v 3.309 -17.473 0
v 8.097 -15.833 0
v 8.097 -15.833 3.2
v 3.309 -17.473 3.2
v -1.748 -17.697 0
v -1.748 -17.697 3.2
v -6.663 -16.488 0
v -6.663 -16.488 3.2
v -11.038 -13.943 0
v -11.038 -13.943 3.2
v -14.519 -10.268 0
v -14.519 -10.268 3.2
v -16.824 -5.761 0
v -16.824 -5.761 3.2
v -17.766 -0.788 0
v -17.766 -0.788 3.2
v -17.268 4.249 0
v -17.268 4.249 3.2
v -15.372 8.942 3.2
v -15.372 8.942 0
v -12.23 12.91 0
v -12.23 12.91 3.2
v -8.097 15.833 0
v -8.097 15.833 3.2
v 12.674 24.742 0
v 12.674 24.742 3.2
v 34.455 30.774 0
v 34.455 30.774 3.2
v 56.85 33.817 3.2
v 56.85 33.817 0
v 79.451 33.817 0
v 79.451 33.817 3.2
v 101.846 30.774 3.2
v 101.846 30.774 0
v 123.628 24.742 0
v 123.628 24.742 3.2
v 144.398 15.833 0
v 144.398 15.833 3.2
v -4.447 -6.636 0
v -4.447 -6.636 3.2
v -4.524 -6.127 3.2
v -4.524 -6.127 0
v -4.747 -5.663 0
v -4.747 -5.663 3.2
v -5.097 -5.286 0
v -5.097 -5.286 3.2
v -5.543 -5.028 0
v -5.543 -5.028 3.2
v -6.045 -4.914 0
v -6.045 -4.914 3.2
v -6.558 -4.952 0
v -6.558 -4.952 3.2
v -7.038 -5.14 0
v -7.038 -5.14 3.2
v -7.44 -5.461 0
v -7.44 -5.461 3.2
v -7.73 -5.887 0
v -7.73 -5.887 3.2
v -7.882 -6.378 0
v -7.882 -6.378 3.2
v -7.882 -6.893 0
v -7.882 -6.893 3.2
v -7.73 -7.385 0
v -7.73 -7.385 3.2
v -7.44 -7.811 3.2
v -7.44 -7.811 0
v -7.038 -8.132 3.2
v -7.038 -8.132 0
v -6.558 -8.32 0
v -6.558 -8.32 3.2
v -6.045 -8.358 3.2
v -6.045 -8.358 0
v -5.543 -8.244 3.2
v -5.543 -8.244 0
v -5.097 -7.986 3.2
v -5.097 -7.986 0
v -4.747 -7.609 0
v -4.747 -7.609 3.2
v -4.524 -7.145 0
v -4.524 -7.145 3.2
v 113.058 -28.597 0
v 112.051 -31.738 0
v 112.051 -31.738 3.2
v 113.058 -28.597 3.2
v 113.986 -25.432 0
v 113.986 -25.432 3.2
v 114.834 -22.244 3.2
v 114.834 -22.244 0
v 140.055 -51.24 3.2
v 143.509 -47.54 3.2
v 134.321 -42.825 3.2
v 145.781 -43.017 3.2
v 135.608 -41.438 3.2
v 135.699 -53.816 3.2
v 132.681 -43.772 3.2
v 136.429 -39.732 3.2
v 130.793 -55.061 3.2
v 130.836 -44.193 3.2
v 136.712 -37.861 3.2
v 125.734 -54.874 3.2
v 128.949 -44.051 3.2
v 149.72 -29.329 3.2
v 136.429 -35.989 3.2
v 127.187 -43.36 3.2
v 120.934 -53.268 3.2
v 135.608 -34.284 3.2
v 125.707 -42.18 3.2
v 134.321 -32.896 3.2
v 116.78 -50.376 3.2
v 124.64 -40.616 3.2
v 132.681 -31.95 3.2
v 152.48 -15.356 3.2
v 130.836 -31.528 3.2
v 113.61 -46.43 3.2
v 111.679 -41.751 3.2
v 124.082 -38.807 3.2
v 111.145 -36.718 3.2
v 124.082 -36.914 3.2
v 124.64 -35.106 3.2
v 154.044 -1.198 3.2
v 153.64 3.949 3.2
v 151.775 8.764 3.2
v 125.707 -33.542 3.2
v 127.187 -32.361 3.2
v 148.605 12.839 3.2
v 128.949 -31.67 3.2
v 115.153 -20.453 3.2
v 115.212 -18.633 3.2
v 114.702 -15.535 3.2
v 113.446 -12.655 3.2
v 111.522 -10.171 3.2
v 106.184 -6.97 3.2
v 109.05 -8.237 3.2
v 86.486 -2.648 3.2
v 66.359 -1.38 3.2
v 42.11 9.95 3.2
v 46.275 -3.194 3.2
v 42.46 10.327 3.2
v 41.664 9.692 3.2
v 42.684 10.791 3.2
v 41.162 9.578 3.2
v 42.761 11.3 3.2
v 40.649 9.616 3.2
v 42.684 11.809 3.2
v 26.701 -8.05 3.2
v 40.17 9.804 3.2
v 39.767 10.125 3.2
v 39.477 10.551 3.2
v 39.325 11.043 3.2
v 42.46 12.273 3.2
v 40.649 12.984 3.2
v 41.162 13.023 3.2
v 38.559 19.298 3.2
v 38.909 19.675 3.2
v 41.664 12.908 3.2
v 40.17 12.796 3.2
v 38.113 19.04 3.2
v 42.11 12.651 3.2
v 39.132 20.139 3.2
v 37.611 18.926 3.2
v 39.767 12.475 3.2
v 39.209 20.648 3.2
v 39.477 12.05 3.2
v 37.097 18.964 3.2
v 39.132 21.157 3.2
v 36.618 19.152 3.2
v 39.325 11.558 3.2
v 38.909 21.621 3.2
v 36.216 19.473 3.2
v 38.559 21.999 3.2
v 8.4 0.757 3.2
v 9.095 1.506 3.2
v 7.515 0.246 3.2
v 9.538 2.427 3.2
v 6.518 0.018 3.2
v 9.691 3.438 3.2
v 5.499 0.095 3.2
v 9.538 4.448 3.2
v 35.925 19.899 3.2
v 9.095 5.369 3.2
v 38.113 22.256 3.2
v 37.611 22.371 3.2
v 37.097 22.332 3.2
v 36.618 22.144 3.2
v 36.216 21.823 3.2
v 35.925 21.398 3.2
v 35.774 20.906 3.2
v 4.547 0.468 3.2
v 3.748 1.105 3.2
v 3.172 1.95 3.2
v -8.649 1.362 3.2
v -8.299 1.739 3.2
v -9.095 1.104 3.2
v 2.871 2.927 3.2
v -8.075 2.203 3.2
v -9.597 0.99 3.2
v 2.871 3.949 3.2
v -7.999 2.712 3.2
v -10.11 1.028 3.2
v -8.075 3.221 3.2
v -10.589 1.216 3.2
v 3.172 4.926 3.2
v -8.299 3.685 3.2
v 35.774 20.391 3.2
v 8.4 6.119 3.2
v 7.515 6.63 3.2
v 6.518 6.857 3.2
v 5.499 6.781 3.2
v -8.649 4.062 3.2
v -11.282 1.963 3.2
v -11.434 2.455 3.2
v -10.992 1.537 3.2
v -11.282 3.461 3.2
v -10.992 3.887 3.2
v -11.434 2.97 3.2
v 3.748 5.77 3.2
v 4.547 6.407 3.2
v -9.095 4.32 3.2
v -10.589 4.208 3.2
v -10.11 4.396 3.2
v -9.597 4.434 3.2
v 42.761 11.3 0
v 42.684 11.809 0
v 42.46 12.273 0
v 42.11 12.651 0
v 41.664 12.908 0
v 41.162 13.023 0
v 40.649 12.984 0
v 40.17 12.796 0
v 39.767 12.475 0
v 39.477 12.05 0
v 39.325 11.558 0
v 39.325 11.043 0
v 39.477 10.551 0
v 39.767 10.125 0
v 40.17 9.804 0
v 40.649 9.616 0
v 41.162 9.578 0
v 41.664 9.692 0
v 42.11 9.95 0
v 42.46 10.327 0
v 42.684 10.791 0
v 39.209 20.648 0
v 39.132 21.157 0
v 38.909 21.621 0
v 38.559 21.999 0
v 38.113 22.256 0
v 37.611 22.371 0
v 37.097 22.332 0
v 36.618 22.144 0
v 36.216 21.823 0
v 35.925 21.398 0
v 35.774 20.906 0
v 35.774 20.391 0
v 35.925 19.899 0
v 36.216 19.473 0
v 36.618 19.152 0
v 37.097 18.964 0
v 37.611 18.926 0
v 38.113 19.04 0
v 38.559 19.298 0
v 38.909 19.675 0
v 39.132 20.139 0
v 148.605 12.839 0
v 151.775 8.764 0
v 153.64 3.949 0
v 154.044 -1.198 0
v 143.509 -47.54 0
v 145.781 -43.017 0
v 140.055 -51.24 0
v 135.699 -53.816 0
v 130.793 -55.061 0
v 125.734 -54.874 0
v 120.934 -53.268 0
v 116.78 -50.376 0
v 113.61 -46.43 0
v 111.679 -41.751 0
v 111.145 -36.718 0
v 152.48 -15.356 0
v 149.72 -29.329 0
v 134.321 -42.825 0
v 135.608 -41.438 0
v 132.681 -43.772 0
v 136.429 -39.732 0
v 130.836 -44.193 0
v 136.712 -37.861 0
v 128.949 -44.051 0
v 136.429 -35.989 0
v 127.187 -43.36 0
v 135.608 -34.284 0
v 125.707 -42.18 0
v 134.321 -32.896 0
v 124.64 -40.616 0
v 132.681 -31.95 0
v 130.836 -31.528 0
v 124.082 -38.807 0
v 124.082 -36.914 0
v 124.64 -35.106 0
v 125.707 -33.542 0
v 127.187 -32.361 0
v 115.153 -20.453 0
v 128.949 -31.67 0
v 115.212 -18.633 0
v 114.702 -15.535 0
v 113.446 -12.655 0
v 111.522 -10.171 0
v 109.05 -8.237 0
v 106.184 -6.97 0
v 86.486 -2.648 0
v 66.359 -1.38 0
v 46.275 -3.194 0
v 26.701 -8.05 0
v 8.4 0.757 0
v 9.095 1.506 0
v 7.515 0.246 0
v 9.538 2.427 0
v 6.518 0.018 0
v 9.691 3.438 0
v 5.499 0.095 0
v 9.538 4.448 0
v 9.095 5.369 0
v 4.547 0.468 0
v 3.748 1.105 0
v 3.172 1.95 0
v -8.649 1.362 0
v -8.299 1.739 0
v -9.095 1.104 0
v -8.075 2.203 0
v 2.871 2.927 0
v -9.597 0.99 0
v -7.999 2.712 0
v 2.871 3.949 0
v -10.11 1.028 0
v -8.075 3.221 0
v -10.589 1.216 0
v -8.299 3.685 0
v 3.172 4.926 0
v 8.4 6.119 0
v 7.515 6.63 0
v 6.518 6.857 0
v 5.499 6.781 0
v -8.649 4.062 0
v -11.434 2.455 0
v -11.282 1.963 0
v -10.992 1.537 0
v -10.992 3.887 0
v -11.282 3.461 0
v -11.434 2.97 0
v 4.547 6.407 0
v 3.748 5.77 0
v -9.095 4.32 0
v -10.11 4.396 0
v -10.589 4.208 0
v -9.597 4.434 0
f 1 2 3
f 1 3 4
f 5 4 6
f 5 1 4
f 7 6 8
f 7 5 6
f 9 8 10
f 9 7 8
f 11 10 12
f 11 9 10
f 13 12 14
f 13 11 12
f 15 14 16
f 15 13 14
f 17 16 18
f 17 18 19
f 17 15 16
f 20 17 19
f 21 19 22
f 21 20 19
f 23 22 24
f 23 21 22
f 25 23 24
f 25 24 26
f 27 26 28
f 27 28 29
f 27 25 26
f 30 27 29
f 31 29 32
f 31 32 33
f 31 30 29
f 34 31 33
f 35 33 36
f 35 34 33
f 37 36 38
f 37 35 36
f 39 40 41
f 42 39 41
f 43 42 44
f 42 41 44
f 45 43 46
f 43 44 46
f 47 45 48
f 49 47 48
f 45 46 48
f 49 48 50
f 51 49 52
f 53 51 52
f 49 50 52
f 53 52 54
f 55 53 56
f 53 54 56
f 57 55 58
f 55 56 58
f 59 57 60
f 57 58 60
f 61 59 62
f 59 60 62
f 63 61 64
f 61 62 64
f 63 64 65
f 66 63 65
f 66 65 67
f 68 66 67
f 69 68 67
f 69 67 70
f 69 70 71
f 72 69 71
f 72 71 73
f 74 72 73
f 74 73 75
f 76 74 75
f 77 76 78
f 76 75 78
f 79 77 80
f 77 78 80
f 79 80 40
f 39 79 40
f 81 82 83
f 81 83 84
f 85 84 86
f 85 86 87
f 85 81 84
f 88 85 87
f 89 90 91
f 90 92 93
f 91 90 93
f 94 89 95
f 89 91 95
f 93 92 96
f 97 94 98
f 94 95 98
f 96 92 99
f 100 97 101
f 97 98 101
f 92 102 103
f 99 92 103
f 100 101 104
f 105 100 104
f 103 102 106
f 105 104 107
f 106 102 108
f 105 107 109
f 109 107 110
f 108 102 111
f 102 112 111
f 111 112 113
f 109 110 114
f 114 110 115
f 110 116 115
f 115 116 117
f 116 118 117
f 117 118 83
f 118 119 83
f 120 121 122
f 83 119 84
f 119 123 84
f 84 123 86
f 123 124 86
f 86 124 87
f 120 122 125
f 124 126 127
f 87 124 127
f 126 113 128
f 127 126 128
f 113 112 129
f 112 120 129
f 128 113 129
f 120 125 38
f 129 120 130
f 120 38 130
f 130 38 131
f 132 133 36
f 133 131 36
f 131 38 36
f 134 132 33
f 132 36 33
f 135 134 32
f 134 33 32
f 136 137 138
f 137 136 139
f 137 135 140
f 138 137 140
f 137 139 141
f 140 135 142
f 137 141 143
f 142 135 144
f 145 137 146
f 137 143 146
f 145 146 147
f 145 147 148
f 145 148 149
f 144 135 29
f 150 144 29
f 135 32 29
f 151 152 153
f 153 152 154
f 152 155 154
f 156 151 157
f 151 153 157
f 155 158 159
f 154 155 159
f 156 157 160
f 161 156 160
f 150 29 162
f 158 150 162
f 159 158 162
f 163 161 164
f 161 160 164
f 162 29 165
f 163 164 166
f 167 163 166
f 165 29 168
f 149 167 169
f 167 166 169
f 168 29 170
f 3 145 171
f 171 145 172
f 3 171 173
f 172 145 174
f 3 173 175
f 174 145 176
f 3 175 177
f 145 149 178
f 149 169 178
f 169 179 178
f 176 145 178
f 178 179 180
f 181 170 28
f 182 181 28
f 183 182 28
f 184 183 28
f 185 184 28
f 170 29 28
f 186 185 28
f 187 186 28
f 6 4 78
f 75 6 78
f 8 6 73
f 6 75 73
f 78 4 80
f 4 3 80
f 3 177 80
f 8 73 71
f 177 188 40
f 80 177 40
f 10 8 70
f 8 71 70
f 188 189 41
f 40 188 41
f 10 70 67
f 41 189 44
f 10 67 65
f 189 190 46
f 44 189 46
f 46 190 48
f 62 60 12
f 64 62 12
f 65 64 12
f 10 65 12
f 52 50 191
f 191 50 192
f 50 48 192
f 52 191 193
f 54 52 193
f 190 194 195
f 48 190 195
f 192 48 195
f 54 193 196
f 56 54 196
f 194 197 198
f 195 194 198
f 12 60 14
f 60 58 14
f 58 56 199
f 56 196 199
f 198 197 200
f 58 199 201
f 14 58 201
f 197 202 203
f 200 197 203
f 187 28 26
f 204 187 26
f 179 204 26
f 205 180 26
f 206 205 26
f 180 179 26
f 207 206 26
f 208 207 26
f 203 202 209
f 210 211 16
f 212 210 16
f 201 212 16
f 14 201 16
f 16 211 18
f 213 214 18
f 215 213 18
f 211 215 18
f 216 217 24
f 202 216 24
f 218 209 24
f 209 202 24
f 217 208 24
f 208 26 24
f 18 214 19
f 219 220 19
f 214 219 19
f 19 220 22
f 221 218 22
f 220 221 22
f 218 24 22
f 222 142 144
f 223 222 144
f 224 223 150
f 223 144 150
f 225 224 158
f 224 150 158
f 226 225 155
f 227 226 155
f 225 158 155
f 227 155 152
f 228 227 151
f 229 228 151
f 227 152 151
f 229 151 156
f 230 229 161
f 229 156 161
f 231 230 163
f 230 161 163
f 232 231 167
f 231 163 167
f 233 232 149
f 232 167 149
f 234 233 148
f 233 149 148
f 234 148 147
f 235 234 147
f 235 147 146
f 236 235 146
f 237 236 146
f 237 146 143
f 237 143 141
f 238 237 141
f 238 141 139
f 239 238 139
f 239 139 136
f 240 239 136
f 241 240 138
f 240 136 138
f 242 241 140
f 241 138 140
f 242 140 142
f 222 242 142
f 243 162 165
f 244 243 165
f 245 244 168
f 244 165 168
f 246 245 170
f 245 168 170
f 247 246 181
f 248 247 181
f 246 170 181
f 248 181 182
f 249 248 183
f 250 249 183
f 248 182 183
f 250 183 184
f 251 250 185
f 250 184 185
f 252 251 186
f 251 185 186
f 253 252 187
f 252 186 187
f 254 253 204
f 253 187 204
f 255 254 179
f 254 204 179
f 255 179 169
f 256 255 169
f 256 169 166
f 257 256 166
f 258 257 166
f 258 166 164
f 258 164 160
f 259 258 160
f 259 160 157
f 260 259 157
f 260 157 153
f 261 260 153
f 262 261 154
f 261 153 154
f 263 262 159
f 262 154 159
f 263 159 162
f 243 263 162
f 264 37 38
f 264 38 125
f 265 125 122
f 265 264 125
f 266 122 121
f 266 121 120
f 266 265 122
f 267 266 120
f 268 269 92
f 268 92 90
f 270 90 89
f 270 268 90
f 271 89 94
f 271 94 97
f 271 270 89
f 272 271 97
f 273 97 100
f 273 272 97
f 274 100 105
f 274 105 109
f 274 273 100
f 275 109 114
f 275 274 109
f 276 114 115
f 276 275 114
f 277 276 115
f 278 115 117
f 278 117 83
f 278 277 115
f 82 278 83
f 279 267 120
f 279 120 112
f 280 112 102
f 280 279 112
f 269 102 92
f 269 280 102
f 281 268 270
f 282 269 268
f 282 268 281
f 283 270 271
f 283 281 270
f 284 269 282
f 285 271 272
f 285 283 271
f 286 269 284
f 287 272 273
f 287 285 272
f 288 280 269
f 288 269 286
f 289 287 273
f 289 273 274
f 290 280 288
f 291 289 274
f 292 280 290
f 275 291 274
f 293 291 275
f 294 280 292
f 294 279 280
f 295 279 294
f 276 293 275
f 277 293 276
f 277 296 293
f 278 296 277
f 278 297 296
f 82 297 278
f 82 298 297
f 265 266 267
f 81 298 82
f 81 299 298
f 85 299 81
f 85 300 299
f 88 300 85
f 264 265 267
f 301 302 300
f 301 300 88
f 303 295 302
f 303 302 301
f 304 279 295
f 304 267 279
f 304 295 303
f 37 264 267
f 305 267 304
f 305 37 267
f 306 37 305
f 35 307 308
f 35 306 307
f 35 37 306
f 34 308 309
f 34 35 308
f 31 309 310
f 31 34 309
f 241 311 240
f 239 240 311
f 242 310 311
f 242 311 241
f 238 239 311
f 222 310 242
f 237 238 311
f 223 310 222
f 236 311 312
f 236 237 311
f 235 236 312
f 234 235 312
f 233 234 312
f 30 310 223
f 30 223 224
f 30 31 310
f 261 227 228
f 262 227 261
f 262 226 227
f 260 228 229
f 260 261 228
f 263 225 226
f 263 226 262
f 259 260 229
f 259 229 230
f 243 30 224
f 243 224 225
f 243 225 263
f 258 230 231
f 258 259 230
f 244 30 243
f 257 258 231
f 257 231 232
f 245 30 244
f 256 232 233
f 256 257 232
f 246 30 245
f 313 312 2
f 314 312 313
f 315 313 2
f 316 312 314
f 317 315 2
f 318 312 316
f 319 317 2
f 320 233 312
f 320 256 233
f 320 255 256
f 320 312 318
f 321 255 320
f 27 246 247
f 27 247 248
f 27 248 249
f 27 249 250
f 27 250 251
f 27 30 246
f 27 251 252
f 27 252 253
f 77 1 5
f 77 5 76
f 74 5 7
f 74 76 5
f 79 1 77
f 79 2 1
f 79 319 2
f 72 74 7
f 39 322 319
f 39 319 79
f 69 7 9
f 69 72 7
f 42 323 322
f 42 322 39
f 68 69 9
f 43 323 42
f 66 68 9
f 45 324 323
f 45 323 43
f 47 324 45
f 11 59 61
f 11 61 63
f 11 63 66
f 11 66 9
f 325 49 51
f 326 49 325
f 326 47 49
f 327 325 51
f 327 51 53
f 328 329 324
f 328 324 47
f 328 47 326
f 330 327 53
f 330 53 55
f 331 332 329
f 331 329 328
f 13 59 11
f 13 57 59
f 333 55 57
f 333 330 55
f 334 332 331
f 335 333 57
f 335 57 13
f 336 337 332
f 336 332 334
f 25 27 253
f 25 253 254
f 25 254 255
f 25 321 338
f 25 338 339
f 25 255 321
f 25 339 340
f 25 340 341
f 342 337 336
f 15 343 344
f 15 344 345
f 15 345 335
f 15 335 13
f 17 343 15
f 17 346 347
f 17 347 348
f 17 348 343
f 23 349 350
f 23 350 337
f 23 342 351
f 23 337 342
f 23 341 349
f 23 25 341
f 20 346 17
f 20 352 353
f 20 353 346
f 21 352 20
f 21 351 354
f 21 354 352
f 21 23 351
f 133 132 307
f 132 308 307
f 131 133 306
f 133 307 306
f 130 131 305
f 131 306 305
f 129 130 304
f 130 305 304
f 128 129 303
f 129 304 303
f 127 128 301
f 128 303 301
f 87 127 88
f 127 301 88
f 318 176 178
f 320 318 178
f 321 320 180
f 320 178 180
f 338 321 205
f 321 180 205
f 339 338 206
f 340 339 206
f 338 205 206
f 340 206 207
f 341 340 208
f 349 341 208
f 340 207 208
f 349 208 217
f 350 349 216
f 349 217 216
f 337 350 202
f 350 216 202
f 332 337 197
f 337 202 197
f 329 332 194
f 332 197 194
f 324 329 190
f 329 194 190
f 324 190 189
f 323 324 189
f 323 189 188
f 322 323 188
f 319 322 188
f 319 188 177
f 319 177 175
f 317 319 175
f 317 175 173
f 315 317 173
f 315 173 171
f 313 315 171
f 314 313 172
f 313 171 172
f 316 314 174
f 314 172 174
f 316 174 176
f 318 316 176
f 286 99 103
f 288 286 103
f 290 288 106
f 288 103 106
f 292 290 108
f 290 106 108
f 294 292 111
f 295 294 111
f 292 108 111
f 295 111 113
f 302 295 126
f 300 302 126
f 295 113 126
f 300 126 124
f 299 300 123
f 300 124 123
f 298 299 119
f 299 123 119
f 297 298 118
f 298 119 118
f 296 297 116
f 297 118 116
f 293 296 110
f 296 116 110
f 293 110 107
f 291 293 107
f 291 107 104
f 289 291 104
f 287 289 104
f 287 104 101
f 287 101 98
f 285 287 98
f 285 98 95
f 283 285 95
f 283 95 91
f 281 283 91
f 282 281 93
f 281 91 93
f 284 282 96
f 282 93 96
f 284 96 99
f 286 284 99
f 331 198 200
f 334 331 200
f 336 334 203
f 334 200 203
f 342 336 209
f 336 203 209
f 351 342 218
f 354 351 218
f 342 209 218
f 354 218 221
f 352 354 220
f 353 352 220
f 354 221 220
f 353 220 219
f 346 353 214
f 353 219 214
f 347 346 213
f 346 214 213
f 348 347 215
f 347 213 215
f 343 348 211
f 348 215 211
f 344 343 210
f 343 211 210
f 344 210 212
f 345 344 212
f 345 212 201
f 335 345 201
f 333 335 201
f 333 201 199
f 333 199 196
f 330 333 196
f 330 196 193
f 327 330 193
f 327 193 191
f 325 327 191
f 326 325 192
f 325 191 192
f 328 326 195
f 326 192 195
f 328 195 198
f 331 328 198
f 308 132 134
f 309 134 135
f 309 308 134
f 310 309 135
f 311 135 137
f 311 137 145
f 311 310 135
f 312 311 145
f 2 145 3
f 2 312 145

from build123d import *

# Parameters (mm, degrees)
BOSS_EXTRUDE1_DEPTH = 3.2004
SKETCH2_R           = 1.7272
SKETCH2_R_2         = 3.429
CUT_EXTRUDE1_DEPTH  = 3.2004
BOSS_EXTRUDE2_START = -3.2004
BOSS_EXTRUDE2_DEPTH = 3.2004
SKETCH4_R           = 6.35
CUT_EXTRUDE2_DEPTH  = 3.2004
FILLET1_R           = 12.7


with BuildPart() as part:
    # Sketch1 → Boss-Extrude1 (new body)
    with BuildSketch(Plane.XY):
        with BuildLine():
            ThreePointArc((-8.097097761, 15.832735205), (68.150612211, 34.198640293), (144.398322183, 15.832735205))
            ThreePointArc((144.398322183, 15.832735205), (152.133959628, -8.097097761), (128.204126662, -15.832735205))
            ThreePointArc((128.204126662, -15.832735205), (68.150612211, -1.367551307), (8.097097761, -15.832735205))
            ThreePointArc((8.097097761, -15.832735205), (-15.832735205, -8.097097761), (-8.097097761, 15.832735205))
        make_face()
    extrude(amount=BOSS_EXTRUDE1_DEPTH)

    # Sketch2 → Cut-Extrude1 (cut)
    with BuildSketch(Plane.XY.offset(3.2004)):
        with Locations((41.033365074, 11.300266799)):
            Circle(SKETCH2_R)
        with Locations((-9.725802761, 2.712083558)):
            Circle(SKETCH2_R)
        with Locations((-6.174081457, -6.6359257)):
            Circle(SKETCH2_R)
        with Locations((37.48164377, 20.648276058)):
            Circle(SKETCH2_R)
        with Locations((6.261836343, 3.437760818)):
            Circle(SKETCH2_R_2)
    extrude(amount=-CUT_EXTRUDE1_DEPTH, mode=Mode.SUBTRACT)

    # Sketch3 → Boss-Extrude2 (add)
    with BuildSketch(Plane.XY.offset(3.2004).offset(BOSS_EXTRUDE2_START)):
        with BuildLine():
            ThreePointArc((118.558560015, 1.198480685), (137.499705108, 17.742664408), (154.04388883, -1.198480685))
            ThreePointArc((154.04388883, -1.198480685), (151.248704167, -22.371604894), (145.781416871, -43.0167742))
            ThreePointArc((145.781416871, -43.0167742), (123.276823543, -54.242649292), (112.05094845, -31.738055964))
            ThreePointArc((112.05094845, -31.738055964), (116.357042584, -15.477699112), (118.558560015, 1.198480685))
        make_face()
    extrude(amount=BOSS_EXTRUDE2_DEPTH)

    # Sketch4 → Cut-Extrude2 (cut)
    with BuildSketch(Plane.XY.offset(3.2004)):
        with Locations((130.361522506, -37.860704571)):
            Circle(SKETCH4_R)
    extrude(amount=-CUT_EXTRUDE2_DEPTH, mode=Mode.SUBTRACT)

    # Fillet1
    fillet1_edges = [part.edges().sort_by_distance(p)[0] for p in [
        (117.190242121, -10.823434725, 1.6002),
    ]]
    fillet(fillet1_edges, radius=FILLET1_R)


solid = part.part
